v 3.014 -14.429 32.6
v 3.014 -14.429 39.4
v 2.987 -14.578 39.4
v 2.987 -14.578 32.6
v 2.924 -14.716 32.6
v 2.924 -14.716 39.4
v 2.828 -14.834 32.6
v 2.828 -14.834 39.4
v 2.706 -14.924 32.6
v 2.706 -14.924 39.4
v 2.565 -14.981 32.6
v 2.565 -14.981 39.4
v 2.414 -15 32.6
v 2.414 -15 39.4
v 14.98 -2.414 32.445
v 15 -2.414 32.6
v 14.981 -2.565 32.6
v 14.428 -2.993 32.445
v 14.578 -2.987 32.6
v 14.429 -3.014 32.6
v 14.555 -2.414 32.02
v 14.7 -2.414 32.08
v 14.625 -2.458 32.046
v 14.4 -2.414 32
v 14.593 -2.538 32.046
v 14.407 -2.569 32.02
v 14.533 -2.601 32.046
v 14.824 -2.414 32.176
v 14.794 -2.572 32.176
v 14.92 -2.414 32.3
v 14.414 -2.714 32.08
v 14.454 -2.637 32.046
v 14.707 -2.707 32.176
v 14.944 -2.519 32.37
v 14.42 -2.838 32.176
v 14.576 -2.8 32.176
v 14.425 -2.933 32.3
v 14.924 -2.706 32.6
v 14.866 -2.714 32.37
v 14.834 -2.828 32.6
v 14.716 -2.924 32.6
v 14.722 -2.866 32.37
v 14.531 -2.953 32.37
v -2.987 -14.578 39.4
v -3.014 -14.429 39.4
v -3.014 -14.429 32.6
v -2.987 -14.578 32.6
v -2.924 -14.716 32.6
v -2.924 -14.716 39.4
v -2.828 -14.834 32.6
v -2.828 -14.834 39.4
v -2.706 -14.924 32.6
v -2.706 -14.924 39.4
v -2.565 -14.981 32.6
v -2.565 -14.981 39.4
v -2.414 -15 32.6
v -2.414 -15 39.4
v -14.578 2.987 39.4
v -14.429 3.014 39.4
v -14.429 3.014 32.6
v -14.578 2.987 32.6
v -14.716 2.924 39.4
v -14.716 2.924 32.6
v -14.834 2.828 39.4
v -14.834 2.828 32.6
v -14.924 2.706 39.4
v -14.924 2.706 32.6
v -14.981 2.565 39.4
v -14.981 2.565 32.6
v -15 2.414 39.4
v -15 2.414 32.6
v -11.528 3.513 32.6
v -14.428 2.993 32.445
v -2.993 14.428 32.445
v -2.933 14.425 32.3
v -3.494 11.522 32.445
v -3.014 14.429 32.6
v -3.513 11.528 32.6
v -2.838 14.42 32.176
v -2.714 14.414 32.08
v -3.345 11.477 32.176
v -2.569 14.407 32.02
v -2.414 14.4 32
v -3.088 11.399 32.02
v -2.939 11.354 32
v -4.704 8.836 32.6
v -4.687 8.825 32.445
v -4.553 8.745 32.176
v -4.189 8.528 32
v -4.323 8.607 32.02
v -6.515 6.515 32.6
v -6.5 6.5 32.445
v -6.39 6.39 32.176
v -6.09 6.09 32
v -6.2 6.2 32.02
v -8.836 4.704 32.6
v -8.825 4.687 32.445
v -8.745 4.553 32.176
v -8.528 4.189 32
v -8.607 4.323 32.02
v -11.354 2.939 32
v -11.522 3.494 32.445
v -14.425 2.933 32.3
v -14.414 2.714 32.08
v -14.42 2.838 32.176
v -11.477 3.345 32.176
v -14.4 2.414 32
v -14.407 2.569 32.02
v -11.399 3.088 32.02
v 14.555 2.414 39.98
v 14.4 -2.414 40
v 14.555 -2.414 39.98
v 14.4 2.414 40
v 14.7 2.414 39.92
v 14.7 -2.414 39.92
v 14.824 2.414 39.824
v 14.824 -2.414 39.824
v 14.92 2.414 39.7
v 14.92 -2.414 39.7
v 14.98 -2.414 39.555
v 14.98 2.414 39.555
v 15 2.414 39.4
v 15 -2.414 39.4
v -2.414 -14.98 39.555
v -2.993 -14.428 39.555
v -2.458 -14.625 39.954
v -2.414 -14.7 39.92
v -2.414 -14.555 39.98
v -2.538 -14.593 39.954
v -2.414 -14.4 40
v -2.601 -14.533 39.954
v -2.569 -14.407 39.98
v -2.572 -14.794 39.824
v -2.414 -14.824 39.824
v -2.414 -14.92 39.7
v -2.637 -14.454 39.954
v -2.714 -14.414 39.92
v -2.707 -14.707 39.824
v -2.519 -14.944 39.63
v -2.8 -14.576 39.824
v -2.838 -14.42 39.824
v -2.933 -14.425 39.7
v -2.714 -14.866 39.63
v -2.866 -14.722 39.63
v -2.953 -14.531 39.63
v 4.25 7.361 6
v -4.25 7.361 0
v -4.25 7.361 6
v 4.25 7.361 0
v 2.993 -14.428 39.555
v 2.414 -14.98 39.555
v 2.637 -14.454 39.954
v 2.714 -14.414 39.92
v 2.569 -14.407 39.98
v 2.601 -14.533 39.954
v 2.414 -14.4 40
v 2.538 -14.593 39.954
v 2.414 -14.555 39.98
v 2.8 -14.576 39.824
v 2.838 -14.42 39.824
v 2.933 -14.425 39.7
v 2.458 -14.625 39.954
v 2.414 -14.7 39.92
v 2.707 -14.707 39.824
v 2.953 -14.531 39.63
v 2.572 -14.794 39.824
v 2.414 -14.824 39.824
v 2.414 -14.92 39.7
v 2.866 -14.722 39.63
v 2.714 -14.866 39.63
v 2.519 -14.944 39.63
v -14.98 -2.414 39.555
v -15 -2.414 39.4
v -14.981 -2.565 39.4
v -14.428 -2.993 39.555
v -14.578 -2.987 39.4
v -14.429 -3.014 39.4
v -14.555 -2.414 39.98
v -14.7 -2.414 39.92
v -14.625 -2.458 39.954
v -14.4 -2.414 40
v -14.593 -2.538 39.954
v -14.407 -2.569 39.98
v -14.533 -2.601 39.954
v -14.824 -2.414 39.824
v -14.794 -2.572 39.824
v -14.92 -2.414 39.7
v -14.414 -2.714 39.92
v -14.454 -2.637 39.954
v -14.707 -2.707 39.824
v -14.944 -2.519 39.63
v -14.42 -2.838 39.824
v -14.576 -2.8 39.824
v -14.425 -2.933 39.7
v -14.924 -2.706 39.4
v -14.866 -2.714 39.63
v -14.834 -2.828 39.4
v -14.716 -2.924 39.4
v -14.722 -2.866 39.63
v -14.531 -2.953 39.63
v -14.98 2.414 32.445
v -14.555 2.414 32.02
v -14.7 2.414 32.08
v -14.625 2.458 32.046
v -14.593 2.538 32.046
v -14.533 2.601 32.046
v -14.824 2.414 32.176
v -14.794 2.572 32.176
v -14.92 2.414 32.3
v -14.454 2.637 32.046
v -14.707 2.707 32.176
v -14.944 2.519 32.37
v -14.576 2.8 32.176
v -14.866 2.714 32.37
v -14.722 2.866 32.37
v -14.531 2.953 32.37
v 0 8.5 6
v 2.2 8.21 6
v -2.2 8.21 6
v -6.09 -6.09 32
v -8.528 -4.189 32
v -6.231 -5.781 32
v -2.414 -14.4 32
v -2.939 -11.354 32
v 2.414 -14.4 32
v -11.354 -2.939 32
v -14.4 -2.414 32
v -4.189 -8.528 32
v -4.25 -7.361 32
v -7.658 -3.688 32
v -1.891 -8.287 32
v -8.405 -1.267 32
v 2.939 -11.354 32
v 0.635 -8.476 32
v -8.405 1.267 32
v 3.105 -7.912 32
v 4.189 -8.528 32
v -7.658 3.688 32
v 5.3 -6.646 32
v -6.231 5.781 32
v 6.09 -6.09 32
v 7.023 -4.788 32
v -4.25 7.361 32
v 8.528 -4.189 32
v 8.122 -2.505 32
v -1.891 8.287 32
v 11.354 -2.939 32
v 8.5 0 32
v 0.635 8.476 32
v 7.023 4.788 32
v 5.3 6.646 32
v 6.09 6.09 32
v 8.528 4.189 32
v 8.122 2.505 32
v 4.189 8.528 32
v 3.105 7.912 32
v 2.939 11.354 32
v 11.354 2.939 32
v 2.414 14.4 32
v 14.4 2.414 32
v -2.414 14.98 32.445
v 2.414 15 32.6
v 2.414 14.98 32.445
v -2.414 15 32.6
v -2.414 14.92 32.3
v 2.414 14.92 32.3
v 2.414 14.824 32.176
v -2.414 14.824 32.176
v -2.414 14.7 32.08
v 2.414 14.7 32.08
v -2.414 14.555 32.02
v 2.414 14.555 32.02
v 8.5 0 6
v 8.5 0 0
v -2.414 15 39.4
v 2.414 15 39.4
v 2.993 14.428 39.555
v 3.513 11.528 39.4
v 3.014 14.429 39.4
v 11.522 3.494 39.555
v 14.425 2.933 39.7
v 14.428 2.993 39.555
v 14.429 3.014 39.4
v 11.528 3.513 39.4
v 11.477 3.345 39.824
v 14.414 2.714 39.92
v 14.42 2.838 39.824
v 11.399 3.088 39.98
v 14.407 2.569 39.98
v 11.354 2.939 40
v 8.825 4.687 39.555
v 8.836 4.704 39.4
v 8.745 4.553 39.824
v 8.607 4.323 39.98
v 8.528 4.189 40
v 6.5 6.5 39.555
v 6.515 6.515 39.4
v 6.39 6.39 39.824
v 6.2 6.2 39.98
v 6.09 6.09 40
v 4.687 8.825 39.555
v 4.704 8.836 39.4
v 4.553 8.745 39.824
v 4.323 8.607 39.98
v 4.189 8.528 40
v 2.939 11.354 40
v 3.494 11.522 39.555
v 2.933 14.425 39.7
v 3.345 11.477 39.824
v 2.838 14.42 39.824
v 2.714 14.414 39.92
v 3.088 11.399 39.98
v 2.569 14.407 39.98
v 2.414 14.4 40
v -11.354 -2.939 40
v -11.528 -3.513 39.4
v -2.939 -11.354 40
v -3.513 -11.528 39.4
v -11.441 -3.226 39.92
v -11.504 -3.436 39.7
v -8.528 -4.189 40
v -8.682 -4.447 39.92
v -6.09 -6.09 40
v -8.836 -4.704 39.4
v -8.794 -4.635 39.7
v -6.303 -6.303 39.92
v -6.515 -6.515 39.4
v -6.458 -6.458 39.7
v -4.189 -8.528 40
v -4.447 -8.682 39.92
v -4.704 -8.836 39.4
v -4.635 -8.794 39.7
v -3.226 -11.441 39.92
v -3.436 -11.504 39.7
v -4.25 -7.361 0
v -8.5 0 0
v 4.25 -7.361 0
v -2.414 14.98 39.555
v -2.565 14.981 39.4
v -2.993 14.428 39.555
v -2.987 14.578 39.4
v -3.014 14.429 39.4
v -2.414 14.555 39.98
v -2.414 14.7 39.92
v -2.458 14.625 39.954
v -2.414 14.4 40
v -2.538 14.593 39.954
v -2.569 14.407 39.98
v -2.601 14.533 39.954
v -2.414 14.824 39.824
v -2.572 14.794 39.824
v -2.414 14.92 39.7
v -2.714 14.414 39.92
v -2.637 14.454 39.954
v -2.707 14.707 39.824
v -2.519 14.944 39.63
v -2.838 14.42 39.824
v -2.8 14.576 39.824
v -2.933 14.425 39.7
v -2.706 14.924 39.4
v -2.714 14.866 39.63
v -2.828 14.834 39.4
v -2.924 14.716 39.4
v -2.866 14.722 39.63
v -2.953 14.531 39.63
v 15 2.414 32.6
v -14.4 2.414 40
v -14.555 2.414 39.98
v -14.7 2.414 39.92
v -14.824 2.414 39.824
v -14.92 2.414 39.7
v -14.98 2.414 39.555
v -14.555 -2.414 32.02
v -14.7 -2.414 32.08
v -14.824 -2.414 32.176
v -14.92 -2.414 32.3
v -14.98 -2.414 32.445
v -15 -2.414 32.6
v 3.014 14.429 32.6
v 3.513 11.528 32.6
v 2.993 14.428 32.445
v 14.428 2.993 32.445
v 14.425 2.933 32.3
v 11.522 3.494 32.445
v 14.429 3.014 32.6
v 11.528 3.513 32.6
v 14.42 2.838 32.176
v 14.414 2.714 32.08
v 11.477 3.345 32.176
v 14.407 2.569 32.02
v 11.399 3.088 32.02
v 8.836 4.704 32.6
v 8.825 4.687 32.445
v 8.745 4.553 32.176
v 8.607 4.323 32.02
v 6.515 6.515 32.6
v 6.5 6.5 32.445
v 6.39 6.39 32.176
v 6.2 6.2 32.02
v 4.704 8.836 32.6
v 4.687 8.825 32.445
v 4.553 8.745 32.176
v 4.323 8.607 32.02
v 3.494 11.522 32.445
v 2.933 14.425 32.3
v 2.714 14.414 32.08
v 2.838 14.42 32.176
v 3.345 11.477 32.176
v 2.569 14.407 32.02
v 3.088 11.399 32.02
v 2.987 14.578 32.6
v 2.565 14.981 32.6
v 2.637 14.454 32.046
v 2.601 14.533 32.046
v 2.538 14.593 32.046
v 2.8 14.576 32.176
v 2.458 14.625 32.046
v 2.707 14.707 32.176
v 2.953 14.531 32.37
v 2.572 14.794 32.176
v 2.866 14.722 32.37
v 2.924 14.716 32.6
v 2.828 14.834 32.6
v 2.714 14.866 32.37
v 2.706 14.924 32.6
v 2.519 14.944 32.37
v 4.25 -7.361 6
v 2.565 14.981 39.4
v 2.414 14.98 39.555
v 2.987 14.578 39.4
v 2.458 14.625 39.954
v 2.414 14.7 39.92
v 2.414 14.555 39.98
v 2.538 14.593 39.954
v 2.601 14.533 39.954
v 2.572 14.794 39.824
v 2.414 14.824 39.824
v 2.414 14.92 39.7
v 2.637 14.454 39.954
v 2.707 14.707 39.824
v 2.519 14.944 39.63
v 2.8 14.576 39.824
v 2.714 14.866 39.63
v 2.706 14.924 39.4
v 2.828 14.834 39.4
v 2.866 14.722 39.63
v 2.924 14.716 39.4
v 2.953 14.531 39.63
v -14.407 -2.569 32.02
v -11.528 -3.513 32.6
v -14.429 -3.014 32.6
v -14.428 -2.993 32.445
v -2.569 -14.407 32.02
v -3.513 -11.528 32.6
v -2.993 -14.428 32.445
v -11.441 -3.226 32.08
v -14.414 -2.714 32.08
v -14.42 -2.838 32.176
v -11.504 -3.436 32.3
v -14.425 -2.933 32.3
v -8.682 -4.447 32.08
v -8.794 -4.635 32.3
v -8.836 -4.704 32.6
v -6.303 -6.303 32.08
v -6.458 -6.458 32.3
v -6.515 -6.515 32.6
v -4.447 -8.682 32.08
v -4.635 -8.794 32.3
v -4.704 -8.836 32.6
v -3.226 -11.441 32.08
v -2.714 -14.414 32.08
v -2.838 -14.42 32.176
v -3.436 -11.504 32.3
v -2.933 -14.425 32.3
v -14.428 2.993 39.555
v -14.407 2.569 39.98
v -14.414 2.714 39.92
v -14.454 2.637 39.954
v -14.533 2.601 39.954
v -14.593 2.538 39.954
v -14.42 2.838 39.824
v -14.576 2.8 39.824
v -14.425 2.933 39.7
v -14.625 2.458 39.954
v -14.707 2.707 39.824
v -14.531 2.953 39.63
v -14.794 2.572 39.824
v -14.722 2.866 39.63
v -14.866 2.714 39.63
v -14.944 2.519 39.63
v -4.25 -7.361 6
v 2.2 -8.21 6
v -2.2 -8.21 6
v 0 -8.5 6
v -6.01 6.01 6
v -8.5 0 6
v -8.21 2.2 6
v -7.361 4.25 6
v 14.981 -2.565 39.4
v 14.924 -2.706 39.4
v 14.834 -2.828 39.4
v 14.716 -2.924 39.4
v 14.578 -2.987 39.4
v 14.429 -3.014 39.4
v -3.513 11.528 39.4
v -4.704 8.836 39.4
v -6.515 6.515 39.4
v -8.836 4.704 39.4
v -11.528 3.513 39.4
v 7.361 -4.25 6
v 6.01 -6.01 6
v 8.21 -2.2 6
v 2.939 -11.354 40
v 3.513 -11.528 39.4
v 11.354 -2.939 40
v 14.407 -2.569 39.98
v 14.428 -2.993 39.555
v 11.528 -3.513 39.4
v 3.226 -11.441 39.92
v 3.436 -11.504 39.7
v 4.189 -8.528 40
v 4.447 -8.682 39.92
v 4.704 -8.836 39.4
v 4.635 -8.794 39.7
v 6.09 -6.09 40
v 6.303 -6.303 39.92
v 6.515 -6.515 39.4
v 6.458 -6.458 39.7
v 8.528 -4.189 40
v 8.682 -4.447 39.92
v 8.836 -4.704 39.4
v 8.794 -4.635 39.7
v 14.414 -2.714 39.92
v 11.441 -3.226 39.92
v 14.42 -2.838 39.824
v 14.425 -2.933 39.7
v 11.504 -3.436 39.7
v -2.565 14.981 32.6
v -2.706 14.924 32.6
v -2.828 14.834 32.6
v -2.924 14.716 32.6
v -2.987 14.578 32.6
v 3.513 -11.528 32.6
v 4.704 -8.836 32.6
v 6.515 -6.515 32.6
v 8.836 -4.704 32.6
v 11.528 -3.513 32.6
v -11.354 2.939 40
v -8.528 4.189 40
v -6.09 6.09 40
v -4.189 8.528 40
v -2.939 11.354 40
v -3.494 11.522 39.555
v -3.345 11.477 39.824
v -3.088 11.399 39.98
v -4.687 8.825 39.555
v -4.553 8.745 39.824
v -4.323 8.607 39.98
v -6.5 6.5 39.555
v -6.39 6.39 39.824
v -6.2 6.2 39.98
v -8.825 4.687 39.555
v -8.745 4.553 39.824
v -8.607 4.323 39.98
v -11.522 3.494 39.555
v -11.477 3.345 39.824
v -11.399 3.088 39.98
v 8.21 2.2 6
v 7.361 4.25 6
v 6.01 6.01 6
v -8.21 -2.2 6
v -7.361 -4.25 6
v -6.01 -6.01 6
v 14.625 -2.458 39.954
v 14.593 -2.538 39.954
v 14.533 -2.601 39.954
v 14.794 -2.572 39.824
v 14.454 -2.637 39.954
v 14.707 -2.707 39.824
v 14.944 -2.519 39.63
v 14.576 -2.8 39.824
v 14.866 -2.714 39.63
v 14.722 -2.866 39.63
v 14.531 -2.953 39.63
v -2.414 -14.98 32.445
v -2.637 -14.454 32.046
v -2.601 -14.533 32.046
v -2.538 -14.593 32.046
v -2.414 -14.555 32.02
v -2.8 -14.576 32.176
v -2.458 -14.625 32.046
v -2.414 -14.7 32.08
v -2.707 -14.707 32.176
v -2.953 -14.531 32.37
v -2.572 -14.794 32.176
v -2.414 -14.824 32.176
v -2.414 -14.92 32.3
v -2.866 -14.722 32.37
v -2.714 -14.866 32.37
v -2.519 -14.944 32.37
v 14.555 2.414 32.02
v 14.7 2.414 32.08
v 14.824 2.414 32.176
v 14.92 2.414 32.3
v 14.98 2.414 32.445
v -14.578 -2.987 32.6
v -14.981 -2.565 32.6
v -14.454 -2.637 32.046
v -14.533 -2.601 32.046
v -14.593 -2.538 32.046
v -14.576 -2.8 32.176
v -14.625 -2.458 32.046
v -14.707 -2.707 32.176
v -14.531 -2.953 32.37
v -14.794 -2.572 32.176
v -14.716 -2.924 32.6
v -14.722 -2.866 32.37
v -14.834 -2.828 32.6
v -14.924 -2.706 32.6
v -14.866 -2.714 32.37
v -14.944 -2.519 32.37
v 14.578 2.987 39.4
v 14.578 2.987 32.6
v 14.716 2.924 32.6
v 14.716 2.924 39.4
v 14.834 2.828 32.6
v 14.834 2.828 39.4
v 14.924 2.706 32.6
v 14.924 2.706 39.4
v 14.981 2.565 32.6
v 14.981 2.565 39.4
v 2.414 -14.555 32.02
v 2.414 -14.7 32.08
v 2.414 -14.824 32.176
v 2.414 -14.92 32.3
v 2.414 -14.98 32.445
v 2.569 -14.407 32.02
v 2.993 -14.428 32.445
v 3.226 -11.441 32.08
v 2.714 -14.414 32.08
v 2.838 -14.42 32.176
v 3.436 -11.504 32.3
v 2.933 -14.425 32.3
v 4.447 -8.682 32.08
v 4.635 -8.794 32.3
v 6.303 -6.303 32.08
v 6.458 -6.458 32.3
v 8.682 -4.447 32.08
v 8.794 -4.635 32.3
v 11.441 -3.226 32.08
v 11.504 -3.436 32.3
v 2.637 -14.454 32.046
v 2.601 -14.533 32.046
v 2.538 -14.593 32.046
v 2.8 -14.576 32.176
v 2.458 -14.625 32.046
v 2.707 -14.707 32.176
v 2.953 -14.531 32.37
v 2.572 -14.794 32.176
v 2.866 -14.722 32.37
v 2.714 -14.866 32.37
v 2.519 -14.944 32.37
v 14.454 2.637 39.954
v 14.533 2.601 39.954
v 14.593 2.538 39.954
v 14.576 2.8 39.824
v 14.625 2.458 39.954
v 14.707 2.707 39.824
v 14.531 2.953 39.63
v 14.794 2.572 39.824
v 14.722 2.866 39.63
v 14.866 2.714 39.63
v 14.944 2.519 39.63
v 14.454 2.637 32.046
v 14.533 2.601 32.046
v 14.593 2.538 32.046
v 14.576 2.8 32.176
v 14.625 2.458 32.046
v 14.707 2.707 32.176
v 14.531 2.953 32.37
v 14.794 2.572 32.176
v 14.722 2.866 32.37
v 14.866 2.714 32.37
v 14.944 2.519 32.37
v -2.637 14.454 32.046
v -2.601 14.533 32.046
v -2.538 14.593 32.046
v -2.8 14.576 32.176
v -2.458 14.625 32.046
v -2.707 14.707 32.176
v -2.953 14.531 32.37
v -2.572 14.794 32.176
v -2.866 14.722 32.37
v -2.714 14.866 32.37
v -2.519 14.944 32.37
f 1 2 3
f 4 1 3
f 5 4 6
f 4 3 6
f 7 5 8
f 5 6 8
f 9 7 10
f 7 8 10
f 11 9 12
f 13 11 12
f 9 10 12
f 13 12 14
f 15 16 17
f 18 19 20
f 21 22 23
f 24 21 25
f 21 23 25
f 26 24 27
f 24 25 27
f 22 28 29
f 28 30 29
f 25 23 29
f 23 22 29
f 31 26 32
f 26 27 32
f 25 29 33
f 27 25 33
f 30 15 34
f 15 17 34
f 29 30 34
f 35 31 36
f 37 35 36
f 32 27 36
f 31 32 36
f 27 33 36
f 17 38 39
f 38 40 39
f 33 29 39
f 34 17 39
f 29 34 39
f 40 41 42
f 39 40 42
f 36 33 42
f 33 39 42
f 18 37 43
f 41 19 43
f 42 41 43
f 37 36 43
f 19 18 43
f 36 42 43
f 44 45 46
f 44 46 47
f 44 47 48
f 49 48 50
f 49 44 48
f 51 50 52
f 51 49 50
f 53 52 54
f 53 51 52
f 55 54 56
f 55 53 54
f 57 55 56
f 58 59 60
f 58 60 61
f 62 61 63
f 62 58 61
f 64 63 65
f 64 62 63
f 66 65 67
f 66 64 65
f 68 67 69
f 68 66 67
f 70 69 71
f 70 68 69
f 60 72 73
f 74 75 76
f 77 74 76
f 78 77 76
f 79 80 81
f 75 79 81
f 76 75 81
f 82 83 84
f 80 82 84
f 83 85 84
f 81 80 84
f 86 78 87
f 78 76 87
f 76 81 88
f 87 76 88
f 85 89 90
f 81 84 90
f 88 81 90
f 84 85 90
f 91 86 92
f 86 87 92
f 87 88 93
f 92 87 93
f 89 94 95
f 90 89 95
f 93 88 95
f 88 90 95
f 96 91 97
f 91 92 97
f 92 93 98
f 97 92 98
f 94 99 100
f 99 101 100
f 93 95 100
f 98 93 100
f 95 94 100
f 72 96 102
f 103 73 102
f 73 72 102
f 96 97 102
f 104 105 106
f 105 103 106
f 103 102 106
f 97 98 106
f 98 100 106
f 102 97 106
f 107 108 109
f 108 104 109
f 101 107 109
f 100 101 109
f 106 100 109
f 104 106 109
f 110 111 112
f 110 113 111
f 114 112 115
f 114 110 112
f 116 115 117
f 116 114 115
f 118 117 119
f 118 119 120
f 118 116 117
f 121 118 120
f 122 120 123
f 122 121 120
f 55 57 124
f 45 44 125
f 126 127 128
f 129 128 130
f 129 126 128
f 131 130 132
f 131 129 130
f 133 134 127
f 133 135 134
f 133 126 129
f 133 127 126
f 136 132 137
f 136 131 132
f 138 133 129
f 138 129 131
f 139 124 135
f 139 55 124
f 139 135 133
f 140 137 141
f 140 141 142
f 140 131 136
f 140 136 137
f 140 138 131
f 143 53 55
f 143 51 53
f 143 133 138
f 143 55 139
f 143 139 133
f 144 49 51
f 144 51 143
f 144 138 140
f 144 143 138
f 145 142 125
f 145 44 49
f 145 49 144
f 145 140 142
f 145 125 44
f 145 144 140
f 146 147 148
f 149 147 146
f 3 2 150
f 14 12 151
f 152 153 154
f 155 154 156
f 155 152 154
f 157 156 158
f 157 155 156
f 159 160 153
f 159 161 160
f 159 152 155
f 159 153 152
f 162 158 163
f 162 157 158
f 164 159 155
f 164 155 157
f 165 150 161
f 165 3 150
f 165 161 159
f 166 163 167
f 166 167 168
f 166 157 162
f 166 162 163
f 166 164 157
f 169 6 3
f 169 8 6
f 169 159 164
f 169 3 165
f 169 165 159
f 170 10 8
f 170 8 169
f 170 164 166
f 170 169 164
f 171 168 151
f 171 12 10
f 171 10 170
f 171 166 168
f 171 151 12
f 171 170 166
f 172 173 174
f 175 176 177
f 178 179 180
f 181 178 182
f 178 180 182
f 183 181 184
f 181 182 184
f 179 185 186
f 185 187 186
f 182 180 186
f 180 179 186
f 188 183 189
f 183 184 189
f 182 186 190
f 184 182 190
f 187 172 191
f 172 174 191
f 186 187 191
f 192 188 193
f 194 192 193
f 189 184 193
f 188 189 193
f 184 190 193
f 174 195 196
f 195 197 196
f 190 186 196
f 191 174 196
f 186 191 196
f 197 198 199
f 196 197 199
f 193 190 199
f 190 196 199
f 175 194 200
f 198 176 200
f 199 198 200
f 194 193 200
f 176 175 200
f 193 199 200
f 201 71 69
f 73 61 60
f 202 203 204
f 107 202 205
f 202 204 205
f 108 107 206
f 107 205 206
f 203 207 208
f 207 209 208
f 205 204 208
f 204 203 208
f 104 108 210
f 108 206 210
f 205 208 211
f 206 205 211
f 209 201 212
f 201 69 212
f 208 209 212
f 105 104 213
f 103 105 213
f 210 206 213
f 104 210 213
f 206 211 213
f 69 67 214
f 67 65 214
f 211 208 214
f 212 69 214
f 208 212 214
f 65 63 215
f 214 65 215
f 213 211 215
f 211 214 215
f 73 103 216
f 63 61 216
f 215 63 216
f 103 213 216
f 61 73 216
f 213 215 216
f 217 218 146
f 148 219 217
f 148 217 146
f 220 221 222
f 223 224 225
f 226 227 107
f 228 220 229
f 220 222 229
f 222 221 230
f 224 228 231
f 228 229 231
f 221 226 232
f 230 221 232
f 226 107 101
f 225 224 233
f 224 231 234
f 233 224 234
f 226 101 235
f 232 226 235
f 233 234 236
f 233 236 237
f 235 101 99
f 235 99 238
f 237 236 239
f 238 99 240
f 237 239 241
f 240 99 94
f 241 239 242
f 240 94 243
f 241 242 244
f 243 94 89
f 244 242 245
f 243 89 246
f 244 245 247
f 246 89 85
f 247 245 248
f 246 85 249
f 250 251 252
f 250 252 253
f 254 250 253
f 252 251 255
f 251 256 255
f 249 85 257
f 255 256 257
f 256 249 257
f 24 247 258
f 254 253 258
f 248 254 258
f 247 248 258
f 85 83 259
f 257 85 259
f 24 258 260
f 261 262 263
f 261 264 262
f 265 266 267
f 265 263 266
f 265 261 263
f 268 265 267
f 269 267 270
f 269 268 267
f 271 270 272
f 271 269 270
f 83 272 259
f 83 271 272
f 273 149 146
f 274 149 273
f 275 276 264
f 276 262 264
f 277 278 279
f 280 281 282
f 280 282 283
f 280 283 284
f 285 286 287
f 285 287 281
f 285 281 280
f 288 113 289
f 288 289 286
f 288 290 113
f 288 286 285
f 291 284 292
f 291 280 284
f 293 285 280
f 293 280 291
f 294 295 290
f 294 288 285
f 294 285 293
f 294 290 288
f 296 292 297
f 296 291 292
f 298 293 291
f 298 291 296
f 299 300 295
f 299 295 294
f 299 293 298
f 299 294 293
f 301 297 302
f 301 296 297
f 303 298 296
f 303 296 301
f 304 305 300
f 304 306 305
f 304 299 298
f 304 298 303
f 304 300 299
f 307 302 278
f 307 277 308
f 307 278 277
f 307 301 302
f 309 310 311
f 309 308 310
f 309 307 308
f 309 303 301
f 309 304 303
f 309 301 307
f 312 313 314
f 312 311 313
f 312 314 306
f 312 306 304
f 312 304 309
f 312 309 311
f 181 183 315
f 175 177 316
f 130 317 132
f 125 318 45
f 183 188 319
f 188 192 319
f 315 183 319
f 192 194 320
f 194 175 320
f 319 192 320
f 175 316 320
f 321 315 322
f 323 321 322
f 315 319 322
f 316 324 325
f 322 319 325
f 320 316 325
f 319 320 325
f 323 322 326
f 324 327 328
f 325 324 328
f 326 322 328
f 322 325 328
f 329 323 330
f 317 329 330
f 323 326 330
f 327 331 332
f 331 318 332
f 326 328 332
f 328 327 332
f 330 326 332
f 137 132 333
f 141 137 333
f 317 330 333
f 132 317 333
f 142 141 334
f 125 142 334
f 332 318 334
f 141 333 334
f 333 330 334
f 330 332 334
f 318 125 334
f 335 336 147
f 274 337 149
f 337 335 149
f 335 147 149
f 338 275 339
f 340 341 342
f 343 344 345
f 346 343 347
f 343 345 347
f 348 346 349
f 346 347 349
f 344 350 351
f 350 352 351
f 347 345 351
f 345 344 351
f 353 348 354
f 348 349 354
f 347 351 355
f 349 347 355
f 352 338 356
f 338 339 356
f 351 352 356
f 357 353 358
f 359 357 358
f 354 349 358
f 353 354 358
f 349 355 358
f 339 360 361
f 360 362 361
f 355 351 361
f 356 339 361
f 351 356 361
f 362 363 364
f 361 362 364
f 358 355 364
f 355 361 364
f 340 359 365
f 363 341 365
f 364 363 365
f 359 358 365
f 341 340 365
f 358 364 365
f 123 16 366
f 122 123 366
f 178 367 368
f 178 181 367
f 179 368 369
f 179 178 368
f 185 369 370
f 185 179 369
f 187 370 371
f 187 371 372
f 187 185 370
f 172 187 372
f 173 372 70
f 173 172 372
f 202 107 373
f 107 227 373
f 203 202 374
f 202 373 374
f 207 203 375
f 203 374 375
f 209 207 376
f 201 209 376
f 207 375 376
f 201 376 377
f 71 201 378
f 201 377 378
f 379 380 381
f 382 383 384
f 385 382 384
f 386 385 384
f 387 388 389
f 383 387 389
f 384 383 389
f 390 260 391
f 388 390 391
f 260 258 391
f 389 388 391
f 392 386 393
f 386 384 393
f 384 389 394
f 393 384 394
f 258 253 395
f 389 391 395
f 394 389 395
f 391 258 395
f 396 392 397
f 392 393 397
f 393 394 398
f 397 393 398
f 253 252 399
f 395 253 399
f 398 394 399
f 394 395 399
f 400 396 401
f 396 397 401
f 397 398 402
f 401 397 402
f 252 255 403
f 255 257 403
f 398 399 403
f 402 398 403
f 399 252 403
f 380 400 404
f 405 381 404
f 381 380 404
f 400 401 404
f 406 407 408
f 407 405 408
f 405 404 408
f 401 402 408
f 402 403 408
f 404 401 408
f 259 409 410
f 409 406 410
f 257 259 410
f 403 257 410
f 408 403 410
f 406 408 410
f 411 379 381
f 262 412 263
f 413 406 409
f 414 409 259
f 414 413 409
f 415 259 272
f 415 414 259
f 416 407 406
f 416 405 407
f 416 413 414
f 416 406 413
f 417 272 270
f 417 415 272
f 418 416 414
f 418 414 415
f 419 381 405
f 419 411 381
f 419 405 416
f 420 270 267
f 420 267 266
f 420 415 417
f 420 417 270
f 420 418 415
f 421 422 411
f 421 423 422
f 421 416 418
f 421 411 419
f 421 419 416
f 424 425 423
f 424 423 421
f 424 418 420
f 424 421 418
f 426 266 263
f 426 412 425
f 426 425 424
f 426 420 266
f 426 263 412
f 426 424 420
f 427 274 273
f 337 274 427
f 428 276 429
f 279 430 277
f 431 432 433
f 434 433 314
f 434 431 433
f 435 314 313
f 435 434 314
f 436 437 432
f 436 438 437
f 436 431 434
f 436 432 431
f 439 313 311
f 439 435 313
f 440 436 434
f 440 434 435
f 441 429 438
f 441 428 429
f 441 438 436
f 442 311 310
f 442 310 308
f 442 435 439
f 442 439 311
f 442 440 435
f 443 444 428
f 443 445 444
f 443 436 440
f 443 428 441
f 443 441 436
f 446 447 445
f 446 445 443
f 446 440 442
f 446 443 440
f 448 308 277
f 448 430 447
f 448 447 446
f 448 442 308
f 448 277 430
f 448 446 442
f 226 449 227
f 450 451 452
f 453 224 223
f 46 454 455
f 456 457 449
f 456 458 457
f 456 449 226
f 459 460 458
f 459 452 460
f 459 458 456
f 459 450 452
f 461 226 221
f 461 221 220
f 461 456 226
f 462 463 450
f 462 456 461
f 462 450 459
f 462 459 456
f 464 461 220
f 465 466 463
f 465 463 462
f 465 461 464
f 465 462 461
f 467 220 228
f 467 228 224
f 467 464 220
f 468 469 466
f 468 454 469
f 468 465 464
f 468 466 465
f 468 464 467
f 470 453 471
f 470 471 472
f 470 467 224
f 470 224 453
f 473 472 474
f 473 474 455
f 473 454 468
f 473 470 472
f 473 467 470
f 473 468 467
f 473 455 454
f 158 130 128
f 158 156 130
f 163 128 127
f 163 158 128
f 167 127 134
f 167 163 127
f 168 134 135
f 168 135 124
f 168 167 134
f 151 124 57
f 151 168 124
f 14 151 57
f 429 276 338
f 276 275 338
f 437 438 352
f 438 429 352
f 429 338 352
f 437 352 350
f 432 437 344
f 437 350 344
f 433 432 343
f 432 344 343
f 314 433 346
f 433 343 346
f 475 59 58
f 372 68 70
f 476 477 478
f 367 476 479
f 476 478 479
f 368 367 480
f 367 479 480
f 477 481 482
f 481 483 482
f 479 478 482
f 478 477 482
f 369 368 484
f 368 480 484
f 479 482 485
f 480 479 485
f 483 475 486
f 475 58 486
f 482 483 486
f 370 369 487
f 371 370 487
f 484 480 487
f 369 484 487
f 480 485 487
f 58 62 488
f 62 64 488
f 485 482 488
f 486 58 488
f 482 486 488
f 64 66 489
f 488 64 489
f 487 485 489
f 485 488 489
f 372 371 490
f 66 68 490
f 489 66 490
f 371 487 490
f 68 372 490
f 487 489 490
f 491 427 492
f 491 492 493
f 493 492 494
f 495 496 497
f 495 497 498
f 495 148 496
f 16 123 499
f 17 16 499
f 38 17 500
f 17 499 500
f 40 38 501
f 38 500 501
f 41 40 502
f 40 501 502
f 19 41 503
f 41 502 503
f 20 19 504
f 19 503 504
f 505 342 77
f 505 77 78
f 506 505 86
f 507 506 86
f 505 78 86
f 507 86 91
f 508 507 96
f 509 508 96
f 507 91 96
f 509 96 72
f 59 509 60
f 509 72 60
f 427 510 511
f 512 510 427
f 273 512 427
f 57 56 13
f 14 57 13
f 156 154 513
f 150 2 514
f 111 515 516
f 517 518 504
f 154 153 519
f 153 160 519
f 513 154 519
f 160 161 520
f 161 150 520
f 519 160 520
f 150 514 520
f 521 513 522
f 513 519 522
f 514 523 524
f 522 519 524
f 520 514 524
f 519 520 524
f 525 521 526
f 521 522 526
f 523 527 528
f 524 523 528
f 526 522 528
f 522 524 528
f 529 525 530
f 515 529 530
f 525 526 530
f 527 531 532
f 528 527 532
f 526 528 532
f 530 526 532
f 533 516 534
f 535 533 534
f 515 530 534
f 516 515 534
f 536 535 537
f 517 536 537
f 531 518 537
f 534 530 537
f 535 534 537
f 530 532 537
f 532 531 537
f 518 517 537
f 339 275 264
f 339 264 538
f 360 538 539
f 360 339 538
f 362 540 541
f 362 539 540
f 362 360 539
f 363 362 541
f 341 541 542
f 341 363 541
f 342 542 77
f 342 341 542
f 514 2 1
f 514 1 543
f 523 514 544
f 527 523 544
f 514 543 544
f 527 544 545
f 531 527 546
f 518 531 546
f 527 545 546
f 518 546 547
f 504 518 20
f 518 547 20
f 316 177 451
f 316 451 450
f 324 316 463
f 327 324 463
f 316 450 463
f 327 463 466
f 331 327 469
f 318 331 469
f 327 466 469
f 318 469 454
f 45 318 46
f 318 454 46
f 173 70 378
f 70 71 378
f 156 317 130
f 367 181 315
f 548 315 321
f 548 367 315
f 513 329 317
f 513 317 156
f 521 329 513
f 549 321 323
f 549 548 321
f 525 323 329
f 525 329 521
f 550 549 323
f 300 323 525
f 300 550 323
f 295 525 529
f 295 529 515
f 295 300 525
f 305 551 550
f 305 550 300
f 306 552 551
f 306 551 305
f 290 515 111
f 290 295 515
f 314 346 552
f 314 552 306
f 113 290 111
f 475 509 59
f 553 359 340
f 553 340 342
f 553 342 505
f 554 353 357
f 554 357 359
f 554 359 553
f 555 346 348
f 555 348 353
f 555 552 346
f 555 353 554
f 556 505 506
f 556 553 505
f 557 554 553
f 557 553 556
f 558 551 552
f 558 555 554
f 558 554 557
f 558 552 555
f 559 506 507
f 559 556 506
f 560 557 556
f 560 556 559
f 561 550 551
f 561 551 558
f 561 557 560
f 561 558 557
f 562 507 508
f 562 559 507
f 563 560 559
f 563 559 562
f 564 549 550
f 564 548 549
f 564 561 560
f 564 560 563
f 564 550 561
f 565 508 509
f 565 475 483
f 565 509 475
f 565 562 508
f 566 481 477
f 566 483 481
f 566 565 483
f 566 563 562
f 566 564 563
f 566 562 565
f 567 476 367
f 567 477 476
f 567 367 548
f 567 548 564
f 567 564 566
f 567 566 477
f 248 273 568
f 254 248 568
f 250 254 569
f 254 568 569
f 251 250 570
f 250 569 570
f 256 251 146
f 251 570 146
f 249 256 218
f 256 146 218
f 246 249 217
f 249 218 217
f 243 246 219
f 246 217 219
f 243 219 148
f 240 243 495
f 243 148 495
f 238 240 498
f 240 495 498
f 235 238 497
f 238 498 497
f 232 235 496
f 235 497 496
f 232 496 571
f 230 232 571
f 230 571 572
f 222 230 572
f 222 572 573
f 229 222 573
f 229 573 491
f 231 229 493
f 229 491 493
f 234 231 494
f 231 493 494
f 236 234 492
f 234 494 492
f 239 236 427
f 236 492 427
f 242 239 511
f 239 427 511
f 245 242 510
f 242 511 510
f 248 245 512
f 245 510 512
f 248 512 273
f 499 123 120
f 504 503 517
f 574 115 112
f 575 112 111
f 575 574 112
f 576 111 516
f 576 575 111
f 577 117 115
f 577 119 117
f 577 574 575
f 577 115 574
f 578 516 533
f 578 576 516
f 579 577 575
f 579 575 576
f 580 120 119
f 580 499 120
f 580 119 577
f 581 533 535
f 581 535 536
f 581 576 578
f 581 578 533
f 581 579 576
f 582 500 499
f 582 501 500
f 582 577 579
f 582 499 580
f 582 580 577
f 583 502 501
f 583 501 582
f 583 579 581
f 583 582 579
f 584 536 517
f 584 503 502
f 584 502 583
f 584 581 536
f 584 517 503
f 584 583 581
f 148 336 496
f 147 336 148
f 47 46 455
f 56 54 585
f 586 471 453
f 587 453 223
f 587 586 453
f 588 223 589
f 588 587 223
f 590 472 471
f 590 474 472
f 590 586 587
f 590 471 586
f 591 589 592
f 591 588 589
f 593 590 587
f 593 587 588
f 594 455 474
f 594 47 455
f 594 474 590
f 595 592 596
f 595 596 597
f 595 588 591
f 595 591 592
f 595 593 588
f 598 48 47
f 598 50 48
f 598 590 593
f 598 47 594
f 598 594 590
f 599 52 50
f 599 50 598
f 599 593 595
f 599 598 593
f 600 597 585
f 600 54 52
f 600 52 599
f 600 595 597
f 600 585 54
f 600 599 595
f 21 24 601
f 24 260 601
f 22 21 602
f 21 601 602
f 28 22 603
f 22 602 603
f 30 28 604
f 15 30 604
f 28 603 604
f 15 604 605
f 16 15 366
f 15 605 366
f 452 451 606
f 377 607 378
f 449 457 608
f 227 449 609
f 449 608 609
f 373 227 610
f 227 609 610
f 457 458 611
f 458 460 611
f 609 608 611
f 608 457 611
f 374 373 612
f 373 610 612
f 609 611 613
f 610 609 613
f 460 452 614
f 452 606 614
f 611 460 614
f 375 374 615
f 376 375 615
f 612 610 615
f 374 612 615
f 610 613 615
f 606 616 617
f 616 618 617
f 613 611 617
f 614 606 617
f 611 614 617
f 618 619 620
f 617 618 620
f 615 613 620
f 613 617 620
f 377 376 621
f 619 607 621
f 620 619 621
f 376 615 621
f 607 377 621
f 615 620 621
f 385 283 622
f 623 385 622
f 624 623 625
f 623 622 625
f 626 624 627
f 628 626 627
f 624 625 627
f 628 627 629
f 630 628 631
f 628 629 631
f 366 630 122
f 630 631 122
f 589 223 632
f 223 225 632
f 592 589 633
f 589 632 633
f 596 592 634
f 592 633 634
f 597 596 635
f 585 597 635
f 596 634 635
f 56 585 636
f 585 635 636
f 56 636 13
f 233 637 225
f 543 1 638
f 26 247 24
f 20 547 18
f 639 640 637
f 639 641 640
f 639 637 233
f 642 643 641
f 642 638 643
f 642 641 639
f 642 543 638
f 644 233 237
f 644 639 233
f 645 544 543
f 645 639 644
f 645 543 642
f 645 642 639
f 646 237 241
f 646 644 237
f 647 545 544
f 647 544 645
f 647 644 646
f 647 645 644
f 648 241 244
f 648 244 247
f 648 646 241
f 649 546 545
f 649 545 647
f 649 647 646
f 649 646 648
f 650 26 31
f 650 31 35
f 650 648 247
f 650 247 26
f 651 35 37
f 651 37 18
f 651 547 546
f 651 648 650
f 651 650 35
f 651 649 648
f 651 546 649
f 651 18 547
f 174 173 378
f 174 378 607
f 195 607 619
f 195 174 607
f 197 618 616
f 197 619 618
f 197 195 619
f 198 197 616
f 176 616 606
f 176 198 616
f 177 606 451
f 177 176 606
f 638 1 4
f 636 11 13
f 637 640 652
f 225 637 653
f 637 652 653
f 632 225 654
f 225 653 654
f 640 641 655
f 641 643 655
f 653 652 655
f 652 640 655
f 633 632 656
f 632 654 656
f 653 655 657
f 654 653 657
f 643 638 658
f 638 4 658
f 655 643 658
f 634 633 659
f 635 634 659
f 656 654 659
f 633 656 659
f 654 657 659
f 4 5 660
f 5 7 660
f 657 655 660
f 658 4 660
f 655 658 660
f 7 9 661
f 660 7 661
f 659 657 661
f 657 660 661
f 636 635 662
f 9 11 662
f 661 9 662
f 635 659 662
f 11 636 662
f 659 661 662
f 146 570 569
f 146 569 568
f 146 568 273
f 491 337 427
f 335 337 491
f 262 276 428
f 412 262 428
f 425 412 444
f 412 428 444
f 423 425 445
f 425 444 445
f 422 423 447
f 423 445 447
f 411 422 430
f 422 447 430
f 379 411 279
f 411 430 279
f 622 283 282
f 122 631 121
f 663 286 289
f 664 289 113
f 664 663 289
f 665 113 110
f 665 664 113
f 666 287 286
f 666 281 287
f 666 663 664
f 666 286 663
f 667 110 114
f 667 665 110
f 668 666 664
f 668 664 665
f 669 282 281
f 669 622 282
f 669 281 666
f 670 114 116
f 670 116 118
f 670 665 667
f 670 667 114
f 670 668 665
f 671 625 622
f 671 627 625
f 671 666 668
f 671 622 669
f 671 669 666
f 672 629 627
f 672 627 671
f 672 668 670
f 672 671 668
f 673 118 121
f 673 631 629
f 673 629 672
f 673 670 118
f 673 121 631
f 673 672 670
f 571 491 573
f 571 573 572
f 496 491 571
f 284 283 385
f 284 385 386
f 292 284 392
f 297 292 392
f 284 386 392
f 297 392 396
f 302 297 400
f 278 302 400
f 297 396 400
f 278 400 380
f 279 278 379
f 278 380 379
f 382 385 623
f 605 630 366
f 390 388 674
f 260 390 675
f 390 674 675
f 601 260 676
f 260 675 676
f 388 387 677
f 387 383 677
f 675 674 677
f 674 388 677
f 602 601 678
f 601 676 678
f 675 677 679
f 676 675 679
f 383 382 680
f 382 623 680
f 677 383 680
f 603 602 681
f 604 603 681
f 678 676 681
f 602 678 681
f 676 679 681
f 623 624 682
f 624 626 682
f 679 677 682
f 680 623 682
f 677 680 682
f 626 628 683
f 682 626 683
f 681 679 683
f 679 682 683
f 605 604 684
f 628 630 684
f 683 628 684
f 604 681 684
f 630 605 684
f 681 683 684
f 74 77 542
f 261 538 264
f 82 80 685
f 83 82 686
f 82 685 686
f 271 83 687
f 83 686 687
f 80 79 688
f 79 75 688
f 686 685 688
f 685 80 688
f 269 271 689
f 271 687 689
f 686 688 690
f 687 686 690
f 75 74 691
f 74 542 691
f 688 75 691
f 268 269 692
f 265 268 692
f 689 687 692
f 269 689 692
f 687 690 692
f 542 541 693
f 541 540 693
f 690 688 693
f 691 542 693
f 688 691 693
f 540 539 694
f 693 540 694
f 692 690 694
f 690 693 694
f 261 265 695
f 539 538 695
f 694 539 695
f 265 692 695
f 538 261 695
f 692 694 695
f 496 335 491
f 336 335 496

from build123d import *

# Parameters (mm, degrees)
SKETCH1_R           = 8.5
BOSS_EXTRUDE1_DEPTH = 40
BOSS_EXTRUDE2_START = -8
SKETCH2_W           = 6
SKETCH2_H           = 6
BOSS_EXTRUDE2_DEPTH = 8
SKETCH3_OUTSIDE_W   = 43.662
SKETCH3_OUTSIDE_H   = 43.662
CUT_EXTRUDE1_DEPTH  = 6
FILLET2_R           = 0.6


with BuildPart() as part:
    # Sketch1 → Boss-Extrude1 (new body)
    with BuildSketch(Plane.XY):
        Circle(SKETCH1_R)
    extrude(amount=BOSS_EXTRUDE1_DEPTH)

    # Sketch2 → Boss-Extrude2 (add)
    with BuildSketch(Plane.XY.offset(40).offset(BOSS_EXTRUDE2_START)):
        with BuildLine():
            Line((3, 7.95298686), (3, 15))
            Line((3, 15), (-3, 15))
            Line((-3, 15), (-3, 7.95298686))
            ThreePointArc((-3, 7.95298686), (0, 8.5), (3, 7.95298686))
        make_face()
        with BuildLine():
            Line((-7.95298686, 3), (-3, 3))
            Line((-3, 3), (-3, 7.95298686))
            ThreePointArc((-3, 7.95298686), (-6.01040764, 6.01040764), (-7.95298686, 3))
        make_face()
        with BuildLine():
            Line((-3, 7.95298686), (-3, 15))
            ThreePointArc((-3, 15), (-6.514718626, 6.514718626), (-15, 3))
            Line((-15, 3), (-7.95298686, 3))
            ThreePointArc((-7.95298686, 3), (-6.01040764, 6.01040764), (-3, 7.95298686))
        make_face()
        with BuildLine():
            Line((-3, 3), (3, 3))
            Line((3, 3), (3, 7.95298686))
            ThreePointArc((3, 7.95298686), (0, 8.5), (-3, 7.95298686))
            Line((-3, 7.95298686), (-3, 3))
        make_face()
        Rectangle(SKETCH2_W, SKETCH2_H)
        with BuildLine():
            Line((-3, -3), (-3, 3))
            Line((-3, 3), (-7.95298686, 3))
            ThreePointArc((-7.95298686, 3), (-8.5, 0), (-7.95298686, -3))
            Line((-7.95298686, -3), (-3, -3))
        make_face()
        with BuildLine():
            Line((-7.95298686, 3), (-15, 3))
            Line((-15, 3), (-15, -3))
            Line((-15, -3), (-7.95298686, -3))
            ThreePointArc((-7.95298686, -3), (-8.5, 0), (-7.95298686, 3))
        make_face()
        with BuildLine():
            ThreePointArc((-15, -3), (-6.514718626, -6.514718626), (-3, -15))
            Line((-3, -15), (-3, -7.95298686))
            ThreePointArc((-3, -7.95298686), (-6.01040764, -6.01040764), (-7.95298686, -3))
            Line((-7.95298686, -3), (-15, -3))
        make_face()
        with BuildLine():
            Line((-3, -7.95298686), (-3, -3))
            Line((-3, -3), (-7.95298686, -3))
            ThreePointArc((-7.95298686, -3), (-6.01040764, -6.01040764), (-3, -7.95298686))
        make_face()
        with BuildLine():
            Line((3, -7.95298686), (3, -3))
            Line((3, -3), (-3, -3))
            Line((-3, -3), (-3, -7.95298686))
            ThreePointArc((-3, -7.95298686), (0, -8.5), (3, -7.95298686))
        make_face()
        with BuildLine():
            ThreePointArc((3, -7.95298686), (6.01040764, -6.01040764), (7.95298686, -3))
            Line((7.95298686, -3), (3, -3))
            Line((3, -3), (3, -7.95298686))
        make_face()
        with BuildLine():
            ThreePointArc((8.5, 0), (8.362128566, 1.524731401), (7.95298686, 3))
            Line((7.95298686, 3), (3, 3))
            Line((3, 3), (3, -3))
            Line((3, -3), (7.95298686, -3))
            ThreePointArc((7.95298686, -3), (8.362128566, -1.524731401), (8.5, 0))
        make_face()
        with BuildLine():
            ThreePointArc((3, -15), (6.514718626, -6.514718626), (15, -3))
            Line((15, -3), (7.95298686, -3))
            ThreePointArc((7.95298686, -3), (6.01040764, -6.01040764), (3, -7.95298686))
            Line((3, -7.95298686), (3, -15))
        make_face()
        with BuildLine():
            Line((15, -3), (15, 3))
            Line((15, 3), (7.95298686, 3))
            ThreePointArc((7.95298686, 3), (8.362128566, 1.524731401), (8.5, 0))
            ThreePointArc((8.5, 0), (8.362128566, -1.524731401), (7.95298686, -3))
            Line((7.95298686, -3), (15, -3))
        make_face()
        with BuildLine():
            Line((7.95298686, 3), (15, 3))
            ThreePointArc((15, 3), (6.514718626, 6.514718626), (3, 15))
            Line((3, 15), (3, 7.95298686))
            ThreePointArc((3, 7.95298686), (6.01040764, 6.01040764), (7.95298686, 3))
        make_face()
        with BuildLine():
            Line((3, 3), (7.95298686, 3))
            ThreePointArc((7.95298686, 3), (6.01040764, 6.01040764), (3, 7.95298686))
            Line((3, 7.95298686), (3, 3))
        make_face()
        with BuildLine():
            Line((-3, -15), (3, -15))
            Line((3, -15), (3, -7.95298686))
            ThreePointArc((3, -7.95298686), (0, -8.5), (-3, -7.95298686))
            Line((-3, -7.95298686), (-3, -15))
        make_face()
    extrude(amount=BOSS_EXTRUDE2_DEPTH)

    # Sketch3 outside → Cut-Extrude1 (cut)
    with BuildSketch(Plane(origin=(0, 0, 0), x_dir=(-1, 0, 0), z_dir=(0, 0, -1))):
        Rectangle(SKETCH3_OUTSIDE_W, SKETCH3_OUTSIDE_H)
        Polygon((4.25, 7.361215932), (-4.25, 7.361215932), (-8.5, 0), (-4.25, -7.361215932), (4.25, -7.361215932), (8.5, 0), align=None, mode=Mode.SUBTRACT)
    extrude(amount=-CUT_EXTRUDE1_DEPTH, mode=Mode.SUBTRACT)

    # Fillet2
    fillet2_edges = [part.edges().sort_by_distance(p)[0] for p in [
        (15, 0, 32),
        (6.514718626, -6.514718626, 32),
        (0, -15, 32),
        (0, 15, 40),
        (-6.514718626, 6.514718626, 40),
        (-15, 0, 40),
        (-6.514718626, -6.514718626, 40),
        (-3, -15, 36),
        (-15, 0, 32),
        (-15, -3, 36),
        (-6.514718626, 6.514718626, 32),
        (-15, 3, 36),
        (0, 15, 32),
        (-3, 15, 36),
        (6.514718626, 6.514718626, 40),
        (3, 15, 36),
        (15, 0, 40),
        (15, 3, 36),
        (6.514718626, -6.514718626, 40),
        (15, -3, 36),
        (0, -15, 40),
        (3, -15, 36),
        (-6.514718626, -6.514718626, 32),
        (6.514718626, 6.514718626, 32),
    ]]
    fillet(fillet2_edges, radius=FILLET2_R)


solid = part.part
